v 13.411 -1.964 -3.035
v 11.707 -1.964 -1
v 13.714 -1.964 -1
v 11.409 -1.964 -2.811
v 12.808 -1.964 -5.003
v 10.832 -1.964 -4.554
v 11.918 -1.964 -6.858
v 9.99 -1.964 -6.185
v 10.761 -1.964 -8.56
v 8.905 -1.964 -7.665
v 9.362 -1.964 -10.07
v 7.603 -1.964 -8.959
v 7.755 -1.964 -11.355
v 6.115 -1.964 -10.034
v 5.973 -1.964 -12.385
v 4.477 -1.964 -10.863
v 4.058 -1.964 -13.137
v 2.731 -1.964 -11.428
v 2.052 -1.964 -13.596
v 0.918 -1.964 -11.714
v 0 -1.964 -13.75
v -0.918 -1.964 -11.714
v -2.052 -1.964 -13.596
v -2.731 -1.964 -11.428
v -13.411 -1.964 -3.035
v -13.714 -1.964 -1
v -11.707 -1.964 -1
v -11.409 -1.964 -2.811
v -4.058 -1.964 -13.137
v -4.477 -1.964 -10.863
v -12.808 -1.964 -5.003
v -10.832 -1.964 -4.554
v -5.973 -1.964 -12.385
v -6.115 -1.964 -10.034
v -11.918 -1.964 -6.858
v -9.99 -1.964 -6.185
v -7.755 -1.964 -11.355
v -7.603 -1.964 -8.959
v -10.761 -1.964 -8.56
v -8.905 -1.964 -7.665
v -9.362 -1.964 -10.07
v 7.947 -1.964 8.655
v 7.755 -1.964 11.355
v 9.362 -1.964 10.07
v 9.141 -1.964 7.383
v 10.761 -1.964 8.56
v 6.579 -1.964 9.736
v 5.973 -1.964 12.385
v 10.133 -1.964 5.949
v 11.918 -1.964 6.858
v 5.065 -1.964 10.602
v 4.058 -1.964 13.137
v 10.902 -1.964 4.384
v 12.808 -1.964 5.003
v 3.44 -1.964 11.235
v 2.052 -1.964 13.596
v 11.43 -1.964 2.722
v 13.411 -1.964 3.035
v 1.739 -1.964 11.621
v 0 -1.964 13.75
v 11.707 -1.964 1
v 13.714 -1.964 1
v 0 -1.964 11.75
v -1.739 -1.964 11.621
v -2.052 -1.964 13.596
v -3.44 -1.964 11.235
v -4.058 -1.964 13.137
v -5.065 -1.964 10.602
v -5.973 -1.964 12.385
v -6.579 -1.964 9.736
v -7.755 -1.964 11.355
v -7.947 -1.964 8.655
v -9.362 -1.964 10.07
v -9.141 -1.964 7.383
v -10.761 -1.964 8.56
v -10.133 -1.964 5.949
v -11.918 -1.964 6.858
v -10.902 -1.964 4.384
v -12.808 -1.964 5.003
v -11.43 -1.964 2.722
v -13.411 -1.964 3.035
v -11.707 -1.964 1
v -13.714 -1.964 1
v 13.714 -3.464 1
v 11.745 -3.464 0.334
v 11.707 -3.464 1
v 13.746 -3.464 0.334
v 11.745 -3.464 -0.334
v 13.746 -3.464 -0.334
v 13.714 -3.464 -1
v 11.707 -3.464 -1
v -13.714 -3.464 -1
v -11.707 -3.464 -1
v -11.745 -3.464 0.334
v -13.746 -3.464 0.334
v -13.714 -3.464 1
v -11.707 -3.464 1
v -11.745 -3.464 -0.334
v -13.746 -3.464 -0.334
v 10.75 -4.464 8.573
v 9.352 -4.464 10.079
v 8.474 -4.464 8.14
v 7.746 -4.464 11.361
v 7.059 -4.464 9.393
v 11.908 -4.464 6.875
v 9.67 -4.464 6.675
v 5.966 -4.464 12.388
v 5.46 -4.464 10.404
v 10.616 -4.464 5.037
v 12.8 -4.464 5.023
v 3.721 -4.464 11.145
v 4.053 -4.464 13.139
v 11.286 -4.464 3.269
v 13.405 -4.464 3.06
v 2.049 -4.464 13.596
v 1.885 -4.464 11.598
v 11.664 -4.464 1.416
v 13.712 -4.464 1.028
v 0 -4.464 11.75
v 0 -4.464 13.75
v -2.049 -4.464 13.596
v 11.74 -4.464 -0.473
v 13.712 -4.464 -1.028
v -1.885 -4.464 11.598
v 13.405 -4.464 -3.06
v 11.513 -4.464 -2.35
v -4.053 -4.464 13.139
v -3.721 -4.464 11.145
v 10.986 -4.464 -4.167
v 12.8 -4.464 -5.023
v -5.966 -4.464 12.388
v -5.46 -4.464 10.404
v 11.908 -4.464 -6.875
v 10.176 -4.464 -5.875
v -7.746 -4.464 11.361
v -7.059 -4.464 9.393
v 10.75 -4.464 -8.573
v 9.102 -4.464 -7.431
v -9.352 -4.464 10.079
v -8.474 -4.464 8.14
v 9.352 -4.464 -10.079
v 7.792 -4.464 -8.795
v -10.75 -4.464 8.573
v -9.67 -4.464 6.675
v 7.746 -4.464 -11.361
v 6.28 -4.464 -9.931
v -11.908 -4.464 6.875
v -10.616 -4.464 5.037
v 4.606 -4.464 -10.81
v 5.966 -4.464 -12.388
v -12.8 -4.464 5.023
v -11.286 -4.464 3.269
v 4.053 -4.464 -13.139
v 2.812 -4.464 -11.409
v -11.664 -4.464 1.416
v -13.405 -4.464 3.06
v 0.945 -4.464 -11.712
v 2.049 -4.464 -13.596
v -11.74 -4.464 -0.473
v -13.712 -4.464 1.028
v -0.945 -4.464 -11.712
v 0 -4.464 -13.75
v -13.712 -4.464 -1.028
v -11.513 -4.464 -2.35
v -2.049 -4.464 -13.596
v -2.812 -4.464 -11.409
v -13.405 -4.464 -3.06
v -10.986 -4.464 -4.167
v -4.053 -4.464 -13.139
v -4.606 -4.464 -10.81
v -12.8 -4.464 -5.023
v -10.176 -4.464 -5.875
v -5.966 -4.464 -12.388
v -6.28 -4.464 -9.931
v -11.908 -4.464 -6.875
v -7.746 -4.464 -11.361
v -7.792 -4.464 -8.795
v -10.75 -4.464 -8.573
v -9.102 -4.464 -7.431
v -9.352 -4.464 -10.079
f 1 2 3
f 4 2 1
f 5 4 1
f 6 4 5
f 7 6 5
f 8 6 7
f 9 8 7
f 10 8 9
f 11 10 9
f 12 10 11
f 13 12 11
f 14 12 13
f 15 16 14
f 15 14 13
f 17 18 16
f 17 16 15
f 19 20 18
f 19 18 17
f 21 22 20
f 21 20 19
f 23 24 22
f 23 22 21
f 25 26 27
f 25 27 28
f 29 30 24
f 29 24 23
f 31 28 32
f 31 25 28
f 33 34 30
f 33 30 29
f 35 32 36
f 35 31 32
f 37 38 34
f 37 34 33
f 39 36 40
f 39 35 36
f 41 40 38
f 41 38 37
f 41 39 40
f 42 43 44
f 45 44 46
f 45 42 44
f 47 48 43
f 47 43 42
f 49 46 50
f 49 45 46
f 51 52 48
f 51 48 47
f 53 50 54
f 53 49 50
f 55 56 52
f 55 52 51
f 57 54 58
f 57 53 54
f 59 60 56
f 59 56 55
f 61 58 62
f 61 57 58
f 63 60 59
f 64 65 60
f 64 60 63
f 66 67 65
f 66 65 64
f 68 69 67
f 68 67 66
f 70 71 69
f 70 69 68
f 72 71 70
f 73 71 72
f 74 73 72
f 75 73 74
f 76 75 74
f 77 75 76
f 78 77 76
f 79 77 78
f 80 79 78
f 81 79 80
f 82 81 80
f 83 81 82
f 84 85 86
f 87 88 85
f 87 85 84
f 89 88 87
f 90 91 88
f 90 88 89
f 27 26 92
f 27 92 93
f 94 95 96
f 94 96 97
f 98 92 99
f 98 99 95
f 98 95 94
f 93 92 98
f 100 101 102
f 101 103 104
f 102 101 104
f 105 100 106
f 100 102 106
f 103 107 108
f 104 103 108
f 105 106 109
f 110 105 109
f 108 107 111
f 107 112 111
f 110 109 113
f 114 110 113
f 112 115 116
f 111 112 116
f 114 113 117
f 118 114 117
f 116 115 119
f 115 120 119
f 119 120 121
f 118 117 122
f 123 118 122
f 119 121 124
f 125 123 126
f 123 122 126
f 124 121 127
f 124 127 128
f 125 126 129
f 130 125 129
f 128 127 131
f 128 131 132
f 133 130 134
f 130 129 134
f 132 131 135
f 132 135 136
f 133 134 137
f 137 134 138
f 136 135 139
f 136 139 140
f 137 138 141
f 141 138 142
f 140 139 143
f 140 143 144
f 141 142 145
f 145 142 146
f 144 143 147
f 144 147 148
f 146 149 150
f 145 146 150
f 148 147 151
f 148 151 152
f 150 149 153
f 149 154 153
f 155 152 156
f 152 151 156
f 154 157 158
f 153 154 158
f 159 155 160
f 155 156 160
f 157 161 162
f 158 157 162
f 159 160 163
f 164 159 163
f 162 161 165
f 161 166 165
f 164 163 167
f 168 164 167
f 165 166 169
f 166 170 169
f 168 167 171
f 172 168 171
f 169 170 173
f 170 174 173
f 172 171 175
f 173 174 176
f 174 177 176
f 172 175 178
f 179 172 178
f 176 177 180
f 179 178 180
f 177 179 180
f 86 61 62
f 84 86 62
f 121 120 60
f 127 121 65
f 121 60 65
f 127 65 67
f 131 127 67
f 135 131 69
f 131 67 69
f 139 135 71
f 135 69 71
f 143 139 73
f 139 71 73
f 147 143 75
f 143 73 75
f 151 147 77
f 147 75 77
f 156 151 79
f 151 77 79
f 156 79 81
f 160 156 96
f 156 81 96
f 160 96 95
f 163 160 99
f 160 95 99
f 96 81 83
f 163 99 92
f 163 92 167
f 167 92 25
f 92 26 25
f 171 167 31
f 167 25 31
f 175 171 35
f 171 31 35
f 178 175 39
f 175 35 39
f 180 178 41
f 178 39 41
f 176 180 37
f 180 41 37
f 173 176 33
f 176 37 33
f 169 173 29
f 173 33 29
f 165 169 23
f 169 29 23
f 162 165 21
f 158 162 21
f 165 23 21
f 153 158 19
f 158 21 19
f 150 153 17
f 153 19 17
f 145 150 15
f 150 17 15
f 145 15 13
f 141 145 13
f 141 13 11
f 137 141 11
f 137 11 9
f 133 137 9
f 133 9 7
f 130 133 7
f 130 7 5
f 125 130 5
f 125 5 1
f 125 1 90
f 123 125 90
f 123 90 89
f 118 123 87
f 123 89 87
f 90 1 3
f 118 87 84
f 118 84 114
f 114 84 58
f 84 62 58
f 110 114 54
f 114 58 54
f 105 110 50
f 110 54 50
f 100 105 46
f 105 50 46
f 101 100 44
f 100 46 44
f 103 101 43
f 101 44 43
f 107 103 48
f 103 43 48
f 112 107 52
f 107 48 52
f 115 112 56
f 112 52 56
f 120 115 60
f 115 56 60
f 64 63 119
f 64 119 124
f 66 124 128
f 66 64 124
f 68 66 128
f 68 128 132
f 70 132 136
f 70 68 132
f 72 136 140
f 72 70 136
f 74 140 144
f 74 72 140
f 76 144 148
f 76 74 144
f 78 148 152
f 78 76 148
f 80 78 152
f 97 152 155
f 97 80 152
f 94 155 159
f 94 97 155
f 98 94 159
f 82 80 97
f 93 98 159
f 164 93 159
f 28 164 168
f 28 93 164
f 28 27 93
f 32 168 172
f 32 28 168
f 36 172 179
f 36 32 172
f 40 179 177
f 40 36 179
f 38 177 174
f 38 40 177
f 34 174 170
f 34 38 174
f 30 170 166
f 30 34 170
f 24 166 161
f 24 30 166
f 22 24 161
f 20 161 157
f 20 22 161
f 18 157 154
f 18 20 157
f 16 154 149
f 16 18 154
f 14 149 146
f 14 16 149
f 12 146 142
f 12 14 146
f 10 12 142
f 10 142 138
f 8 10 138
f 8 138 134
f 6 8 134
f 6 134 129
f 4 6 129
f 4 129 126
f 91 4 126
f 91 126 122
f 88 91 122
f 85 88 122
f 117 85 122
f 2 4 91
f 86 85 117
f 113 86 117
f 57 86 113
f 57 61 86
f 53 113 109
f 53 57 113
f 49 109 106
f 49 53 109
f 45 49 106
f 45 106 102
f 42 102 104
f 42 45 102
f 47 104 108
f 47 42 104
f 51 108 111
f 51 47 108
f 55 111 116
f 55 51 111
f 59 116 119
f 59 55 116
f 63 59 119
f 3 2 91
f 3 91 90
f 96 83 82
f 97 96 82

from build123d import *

# Parameters (mm, degrees)
SKETCH_1_W          = 2
SKETCH_1_H          = 2.5
SKETCH_2_W          = 53.705080546
SKETCH_2_H          = 2
CUT_EXTRUDE_1_DEPTH = 1.5


with BuildPart() as part:
    # 草图1 → 旋转1 (revolve)
    with BuildSketch(Plane.XY, mode=Mode.PRIVATE) as revolve_1_sk:
        with Locations((12.75, -3.214249787)):
            Rectangle(SKETCH_1_W, SKETCH_1_H)
    revolve(revolve_1_sk.sketch.rotate(Axis((0, 56.260842627, 0), (0, -1, 0)), 90), axis=Axis((0, 56.260842627, 0), (0, -1, 0)))  # turned: the seam where the file's is

    # 草图2 → 切除-拉伸1 (cut)
    with BuildSketch(Plane(origin=(0, -1.964249787, 0), x_dir=(1, 0, 0), z_dir=(0, 1, 0))):
        Rectangle(SKETCH_2_W, SKETCH_2_H)
    extrude(amount=-CUT_EXTRUDE_1_DEPTH, mode=Mode.SUBTRACT)


solid = part.part
